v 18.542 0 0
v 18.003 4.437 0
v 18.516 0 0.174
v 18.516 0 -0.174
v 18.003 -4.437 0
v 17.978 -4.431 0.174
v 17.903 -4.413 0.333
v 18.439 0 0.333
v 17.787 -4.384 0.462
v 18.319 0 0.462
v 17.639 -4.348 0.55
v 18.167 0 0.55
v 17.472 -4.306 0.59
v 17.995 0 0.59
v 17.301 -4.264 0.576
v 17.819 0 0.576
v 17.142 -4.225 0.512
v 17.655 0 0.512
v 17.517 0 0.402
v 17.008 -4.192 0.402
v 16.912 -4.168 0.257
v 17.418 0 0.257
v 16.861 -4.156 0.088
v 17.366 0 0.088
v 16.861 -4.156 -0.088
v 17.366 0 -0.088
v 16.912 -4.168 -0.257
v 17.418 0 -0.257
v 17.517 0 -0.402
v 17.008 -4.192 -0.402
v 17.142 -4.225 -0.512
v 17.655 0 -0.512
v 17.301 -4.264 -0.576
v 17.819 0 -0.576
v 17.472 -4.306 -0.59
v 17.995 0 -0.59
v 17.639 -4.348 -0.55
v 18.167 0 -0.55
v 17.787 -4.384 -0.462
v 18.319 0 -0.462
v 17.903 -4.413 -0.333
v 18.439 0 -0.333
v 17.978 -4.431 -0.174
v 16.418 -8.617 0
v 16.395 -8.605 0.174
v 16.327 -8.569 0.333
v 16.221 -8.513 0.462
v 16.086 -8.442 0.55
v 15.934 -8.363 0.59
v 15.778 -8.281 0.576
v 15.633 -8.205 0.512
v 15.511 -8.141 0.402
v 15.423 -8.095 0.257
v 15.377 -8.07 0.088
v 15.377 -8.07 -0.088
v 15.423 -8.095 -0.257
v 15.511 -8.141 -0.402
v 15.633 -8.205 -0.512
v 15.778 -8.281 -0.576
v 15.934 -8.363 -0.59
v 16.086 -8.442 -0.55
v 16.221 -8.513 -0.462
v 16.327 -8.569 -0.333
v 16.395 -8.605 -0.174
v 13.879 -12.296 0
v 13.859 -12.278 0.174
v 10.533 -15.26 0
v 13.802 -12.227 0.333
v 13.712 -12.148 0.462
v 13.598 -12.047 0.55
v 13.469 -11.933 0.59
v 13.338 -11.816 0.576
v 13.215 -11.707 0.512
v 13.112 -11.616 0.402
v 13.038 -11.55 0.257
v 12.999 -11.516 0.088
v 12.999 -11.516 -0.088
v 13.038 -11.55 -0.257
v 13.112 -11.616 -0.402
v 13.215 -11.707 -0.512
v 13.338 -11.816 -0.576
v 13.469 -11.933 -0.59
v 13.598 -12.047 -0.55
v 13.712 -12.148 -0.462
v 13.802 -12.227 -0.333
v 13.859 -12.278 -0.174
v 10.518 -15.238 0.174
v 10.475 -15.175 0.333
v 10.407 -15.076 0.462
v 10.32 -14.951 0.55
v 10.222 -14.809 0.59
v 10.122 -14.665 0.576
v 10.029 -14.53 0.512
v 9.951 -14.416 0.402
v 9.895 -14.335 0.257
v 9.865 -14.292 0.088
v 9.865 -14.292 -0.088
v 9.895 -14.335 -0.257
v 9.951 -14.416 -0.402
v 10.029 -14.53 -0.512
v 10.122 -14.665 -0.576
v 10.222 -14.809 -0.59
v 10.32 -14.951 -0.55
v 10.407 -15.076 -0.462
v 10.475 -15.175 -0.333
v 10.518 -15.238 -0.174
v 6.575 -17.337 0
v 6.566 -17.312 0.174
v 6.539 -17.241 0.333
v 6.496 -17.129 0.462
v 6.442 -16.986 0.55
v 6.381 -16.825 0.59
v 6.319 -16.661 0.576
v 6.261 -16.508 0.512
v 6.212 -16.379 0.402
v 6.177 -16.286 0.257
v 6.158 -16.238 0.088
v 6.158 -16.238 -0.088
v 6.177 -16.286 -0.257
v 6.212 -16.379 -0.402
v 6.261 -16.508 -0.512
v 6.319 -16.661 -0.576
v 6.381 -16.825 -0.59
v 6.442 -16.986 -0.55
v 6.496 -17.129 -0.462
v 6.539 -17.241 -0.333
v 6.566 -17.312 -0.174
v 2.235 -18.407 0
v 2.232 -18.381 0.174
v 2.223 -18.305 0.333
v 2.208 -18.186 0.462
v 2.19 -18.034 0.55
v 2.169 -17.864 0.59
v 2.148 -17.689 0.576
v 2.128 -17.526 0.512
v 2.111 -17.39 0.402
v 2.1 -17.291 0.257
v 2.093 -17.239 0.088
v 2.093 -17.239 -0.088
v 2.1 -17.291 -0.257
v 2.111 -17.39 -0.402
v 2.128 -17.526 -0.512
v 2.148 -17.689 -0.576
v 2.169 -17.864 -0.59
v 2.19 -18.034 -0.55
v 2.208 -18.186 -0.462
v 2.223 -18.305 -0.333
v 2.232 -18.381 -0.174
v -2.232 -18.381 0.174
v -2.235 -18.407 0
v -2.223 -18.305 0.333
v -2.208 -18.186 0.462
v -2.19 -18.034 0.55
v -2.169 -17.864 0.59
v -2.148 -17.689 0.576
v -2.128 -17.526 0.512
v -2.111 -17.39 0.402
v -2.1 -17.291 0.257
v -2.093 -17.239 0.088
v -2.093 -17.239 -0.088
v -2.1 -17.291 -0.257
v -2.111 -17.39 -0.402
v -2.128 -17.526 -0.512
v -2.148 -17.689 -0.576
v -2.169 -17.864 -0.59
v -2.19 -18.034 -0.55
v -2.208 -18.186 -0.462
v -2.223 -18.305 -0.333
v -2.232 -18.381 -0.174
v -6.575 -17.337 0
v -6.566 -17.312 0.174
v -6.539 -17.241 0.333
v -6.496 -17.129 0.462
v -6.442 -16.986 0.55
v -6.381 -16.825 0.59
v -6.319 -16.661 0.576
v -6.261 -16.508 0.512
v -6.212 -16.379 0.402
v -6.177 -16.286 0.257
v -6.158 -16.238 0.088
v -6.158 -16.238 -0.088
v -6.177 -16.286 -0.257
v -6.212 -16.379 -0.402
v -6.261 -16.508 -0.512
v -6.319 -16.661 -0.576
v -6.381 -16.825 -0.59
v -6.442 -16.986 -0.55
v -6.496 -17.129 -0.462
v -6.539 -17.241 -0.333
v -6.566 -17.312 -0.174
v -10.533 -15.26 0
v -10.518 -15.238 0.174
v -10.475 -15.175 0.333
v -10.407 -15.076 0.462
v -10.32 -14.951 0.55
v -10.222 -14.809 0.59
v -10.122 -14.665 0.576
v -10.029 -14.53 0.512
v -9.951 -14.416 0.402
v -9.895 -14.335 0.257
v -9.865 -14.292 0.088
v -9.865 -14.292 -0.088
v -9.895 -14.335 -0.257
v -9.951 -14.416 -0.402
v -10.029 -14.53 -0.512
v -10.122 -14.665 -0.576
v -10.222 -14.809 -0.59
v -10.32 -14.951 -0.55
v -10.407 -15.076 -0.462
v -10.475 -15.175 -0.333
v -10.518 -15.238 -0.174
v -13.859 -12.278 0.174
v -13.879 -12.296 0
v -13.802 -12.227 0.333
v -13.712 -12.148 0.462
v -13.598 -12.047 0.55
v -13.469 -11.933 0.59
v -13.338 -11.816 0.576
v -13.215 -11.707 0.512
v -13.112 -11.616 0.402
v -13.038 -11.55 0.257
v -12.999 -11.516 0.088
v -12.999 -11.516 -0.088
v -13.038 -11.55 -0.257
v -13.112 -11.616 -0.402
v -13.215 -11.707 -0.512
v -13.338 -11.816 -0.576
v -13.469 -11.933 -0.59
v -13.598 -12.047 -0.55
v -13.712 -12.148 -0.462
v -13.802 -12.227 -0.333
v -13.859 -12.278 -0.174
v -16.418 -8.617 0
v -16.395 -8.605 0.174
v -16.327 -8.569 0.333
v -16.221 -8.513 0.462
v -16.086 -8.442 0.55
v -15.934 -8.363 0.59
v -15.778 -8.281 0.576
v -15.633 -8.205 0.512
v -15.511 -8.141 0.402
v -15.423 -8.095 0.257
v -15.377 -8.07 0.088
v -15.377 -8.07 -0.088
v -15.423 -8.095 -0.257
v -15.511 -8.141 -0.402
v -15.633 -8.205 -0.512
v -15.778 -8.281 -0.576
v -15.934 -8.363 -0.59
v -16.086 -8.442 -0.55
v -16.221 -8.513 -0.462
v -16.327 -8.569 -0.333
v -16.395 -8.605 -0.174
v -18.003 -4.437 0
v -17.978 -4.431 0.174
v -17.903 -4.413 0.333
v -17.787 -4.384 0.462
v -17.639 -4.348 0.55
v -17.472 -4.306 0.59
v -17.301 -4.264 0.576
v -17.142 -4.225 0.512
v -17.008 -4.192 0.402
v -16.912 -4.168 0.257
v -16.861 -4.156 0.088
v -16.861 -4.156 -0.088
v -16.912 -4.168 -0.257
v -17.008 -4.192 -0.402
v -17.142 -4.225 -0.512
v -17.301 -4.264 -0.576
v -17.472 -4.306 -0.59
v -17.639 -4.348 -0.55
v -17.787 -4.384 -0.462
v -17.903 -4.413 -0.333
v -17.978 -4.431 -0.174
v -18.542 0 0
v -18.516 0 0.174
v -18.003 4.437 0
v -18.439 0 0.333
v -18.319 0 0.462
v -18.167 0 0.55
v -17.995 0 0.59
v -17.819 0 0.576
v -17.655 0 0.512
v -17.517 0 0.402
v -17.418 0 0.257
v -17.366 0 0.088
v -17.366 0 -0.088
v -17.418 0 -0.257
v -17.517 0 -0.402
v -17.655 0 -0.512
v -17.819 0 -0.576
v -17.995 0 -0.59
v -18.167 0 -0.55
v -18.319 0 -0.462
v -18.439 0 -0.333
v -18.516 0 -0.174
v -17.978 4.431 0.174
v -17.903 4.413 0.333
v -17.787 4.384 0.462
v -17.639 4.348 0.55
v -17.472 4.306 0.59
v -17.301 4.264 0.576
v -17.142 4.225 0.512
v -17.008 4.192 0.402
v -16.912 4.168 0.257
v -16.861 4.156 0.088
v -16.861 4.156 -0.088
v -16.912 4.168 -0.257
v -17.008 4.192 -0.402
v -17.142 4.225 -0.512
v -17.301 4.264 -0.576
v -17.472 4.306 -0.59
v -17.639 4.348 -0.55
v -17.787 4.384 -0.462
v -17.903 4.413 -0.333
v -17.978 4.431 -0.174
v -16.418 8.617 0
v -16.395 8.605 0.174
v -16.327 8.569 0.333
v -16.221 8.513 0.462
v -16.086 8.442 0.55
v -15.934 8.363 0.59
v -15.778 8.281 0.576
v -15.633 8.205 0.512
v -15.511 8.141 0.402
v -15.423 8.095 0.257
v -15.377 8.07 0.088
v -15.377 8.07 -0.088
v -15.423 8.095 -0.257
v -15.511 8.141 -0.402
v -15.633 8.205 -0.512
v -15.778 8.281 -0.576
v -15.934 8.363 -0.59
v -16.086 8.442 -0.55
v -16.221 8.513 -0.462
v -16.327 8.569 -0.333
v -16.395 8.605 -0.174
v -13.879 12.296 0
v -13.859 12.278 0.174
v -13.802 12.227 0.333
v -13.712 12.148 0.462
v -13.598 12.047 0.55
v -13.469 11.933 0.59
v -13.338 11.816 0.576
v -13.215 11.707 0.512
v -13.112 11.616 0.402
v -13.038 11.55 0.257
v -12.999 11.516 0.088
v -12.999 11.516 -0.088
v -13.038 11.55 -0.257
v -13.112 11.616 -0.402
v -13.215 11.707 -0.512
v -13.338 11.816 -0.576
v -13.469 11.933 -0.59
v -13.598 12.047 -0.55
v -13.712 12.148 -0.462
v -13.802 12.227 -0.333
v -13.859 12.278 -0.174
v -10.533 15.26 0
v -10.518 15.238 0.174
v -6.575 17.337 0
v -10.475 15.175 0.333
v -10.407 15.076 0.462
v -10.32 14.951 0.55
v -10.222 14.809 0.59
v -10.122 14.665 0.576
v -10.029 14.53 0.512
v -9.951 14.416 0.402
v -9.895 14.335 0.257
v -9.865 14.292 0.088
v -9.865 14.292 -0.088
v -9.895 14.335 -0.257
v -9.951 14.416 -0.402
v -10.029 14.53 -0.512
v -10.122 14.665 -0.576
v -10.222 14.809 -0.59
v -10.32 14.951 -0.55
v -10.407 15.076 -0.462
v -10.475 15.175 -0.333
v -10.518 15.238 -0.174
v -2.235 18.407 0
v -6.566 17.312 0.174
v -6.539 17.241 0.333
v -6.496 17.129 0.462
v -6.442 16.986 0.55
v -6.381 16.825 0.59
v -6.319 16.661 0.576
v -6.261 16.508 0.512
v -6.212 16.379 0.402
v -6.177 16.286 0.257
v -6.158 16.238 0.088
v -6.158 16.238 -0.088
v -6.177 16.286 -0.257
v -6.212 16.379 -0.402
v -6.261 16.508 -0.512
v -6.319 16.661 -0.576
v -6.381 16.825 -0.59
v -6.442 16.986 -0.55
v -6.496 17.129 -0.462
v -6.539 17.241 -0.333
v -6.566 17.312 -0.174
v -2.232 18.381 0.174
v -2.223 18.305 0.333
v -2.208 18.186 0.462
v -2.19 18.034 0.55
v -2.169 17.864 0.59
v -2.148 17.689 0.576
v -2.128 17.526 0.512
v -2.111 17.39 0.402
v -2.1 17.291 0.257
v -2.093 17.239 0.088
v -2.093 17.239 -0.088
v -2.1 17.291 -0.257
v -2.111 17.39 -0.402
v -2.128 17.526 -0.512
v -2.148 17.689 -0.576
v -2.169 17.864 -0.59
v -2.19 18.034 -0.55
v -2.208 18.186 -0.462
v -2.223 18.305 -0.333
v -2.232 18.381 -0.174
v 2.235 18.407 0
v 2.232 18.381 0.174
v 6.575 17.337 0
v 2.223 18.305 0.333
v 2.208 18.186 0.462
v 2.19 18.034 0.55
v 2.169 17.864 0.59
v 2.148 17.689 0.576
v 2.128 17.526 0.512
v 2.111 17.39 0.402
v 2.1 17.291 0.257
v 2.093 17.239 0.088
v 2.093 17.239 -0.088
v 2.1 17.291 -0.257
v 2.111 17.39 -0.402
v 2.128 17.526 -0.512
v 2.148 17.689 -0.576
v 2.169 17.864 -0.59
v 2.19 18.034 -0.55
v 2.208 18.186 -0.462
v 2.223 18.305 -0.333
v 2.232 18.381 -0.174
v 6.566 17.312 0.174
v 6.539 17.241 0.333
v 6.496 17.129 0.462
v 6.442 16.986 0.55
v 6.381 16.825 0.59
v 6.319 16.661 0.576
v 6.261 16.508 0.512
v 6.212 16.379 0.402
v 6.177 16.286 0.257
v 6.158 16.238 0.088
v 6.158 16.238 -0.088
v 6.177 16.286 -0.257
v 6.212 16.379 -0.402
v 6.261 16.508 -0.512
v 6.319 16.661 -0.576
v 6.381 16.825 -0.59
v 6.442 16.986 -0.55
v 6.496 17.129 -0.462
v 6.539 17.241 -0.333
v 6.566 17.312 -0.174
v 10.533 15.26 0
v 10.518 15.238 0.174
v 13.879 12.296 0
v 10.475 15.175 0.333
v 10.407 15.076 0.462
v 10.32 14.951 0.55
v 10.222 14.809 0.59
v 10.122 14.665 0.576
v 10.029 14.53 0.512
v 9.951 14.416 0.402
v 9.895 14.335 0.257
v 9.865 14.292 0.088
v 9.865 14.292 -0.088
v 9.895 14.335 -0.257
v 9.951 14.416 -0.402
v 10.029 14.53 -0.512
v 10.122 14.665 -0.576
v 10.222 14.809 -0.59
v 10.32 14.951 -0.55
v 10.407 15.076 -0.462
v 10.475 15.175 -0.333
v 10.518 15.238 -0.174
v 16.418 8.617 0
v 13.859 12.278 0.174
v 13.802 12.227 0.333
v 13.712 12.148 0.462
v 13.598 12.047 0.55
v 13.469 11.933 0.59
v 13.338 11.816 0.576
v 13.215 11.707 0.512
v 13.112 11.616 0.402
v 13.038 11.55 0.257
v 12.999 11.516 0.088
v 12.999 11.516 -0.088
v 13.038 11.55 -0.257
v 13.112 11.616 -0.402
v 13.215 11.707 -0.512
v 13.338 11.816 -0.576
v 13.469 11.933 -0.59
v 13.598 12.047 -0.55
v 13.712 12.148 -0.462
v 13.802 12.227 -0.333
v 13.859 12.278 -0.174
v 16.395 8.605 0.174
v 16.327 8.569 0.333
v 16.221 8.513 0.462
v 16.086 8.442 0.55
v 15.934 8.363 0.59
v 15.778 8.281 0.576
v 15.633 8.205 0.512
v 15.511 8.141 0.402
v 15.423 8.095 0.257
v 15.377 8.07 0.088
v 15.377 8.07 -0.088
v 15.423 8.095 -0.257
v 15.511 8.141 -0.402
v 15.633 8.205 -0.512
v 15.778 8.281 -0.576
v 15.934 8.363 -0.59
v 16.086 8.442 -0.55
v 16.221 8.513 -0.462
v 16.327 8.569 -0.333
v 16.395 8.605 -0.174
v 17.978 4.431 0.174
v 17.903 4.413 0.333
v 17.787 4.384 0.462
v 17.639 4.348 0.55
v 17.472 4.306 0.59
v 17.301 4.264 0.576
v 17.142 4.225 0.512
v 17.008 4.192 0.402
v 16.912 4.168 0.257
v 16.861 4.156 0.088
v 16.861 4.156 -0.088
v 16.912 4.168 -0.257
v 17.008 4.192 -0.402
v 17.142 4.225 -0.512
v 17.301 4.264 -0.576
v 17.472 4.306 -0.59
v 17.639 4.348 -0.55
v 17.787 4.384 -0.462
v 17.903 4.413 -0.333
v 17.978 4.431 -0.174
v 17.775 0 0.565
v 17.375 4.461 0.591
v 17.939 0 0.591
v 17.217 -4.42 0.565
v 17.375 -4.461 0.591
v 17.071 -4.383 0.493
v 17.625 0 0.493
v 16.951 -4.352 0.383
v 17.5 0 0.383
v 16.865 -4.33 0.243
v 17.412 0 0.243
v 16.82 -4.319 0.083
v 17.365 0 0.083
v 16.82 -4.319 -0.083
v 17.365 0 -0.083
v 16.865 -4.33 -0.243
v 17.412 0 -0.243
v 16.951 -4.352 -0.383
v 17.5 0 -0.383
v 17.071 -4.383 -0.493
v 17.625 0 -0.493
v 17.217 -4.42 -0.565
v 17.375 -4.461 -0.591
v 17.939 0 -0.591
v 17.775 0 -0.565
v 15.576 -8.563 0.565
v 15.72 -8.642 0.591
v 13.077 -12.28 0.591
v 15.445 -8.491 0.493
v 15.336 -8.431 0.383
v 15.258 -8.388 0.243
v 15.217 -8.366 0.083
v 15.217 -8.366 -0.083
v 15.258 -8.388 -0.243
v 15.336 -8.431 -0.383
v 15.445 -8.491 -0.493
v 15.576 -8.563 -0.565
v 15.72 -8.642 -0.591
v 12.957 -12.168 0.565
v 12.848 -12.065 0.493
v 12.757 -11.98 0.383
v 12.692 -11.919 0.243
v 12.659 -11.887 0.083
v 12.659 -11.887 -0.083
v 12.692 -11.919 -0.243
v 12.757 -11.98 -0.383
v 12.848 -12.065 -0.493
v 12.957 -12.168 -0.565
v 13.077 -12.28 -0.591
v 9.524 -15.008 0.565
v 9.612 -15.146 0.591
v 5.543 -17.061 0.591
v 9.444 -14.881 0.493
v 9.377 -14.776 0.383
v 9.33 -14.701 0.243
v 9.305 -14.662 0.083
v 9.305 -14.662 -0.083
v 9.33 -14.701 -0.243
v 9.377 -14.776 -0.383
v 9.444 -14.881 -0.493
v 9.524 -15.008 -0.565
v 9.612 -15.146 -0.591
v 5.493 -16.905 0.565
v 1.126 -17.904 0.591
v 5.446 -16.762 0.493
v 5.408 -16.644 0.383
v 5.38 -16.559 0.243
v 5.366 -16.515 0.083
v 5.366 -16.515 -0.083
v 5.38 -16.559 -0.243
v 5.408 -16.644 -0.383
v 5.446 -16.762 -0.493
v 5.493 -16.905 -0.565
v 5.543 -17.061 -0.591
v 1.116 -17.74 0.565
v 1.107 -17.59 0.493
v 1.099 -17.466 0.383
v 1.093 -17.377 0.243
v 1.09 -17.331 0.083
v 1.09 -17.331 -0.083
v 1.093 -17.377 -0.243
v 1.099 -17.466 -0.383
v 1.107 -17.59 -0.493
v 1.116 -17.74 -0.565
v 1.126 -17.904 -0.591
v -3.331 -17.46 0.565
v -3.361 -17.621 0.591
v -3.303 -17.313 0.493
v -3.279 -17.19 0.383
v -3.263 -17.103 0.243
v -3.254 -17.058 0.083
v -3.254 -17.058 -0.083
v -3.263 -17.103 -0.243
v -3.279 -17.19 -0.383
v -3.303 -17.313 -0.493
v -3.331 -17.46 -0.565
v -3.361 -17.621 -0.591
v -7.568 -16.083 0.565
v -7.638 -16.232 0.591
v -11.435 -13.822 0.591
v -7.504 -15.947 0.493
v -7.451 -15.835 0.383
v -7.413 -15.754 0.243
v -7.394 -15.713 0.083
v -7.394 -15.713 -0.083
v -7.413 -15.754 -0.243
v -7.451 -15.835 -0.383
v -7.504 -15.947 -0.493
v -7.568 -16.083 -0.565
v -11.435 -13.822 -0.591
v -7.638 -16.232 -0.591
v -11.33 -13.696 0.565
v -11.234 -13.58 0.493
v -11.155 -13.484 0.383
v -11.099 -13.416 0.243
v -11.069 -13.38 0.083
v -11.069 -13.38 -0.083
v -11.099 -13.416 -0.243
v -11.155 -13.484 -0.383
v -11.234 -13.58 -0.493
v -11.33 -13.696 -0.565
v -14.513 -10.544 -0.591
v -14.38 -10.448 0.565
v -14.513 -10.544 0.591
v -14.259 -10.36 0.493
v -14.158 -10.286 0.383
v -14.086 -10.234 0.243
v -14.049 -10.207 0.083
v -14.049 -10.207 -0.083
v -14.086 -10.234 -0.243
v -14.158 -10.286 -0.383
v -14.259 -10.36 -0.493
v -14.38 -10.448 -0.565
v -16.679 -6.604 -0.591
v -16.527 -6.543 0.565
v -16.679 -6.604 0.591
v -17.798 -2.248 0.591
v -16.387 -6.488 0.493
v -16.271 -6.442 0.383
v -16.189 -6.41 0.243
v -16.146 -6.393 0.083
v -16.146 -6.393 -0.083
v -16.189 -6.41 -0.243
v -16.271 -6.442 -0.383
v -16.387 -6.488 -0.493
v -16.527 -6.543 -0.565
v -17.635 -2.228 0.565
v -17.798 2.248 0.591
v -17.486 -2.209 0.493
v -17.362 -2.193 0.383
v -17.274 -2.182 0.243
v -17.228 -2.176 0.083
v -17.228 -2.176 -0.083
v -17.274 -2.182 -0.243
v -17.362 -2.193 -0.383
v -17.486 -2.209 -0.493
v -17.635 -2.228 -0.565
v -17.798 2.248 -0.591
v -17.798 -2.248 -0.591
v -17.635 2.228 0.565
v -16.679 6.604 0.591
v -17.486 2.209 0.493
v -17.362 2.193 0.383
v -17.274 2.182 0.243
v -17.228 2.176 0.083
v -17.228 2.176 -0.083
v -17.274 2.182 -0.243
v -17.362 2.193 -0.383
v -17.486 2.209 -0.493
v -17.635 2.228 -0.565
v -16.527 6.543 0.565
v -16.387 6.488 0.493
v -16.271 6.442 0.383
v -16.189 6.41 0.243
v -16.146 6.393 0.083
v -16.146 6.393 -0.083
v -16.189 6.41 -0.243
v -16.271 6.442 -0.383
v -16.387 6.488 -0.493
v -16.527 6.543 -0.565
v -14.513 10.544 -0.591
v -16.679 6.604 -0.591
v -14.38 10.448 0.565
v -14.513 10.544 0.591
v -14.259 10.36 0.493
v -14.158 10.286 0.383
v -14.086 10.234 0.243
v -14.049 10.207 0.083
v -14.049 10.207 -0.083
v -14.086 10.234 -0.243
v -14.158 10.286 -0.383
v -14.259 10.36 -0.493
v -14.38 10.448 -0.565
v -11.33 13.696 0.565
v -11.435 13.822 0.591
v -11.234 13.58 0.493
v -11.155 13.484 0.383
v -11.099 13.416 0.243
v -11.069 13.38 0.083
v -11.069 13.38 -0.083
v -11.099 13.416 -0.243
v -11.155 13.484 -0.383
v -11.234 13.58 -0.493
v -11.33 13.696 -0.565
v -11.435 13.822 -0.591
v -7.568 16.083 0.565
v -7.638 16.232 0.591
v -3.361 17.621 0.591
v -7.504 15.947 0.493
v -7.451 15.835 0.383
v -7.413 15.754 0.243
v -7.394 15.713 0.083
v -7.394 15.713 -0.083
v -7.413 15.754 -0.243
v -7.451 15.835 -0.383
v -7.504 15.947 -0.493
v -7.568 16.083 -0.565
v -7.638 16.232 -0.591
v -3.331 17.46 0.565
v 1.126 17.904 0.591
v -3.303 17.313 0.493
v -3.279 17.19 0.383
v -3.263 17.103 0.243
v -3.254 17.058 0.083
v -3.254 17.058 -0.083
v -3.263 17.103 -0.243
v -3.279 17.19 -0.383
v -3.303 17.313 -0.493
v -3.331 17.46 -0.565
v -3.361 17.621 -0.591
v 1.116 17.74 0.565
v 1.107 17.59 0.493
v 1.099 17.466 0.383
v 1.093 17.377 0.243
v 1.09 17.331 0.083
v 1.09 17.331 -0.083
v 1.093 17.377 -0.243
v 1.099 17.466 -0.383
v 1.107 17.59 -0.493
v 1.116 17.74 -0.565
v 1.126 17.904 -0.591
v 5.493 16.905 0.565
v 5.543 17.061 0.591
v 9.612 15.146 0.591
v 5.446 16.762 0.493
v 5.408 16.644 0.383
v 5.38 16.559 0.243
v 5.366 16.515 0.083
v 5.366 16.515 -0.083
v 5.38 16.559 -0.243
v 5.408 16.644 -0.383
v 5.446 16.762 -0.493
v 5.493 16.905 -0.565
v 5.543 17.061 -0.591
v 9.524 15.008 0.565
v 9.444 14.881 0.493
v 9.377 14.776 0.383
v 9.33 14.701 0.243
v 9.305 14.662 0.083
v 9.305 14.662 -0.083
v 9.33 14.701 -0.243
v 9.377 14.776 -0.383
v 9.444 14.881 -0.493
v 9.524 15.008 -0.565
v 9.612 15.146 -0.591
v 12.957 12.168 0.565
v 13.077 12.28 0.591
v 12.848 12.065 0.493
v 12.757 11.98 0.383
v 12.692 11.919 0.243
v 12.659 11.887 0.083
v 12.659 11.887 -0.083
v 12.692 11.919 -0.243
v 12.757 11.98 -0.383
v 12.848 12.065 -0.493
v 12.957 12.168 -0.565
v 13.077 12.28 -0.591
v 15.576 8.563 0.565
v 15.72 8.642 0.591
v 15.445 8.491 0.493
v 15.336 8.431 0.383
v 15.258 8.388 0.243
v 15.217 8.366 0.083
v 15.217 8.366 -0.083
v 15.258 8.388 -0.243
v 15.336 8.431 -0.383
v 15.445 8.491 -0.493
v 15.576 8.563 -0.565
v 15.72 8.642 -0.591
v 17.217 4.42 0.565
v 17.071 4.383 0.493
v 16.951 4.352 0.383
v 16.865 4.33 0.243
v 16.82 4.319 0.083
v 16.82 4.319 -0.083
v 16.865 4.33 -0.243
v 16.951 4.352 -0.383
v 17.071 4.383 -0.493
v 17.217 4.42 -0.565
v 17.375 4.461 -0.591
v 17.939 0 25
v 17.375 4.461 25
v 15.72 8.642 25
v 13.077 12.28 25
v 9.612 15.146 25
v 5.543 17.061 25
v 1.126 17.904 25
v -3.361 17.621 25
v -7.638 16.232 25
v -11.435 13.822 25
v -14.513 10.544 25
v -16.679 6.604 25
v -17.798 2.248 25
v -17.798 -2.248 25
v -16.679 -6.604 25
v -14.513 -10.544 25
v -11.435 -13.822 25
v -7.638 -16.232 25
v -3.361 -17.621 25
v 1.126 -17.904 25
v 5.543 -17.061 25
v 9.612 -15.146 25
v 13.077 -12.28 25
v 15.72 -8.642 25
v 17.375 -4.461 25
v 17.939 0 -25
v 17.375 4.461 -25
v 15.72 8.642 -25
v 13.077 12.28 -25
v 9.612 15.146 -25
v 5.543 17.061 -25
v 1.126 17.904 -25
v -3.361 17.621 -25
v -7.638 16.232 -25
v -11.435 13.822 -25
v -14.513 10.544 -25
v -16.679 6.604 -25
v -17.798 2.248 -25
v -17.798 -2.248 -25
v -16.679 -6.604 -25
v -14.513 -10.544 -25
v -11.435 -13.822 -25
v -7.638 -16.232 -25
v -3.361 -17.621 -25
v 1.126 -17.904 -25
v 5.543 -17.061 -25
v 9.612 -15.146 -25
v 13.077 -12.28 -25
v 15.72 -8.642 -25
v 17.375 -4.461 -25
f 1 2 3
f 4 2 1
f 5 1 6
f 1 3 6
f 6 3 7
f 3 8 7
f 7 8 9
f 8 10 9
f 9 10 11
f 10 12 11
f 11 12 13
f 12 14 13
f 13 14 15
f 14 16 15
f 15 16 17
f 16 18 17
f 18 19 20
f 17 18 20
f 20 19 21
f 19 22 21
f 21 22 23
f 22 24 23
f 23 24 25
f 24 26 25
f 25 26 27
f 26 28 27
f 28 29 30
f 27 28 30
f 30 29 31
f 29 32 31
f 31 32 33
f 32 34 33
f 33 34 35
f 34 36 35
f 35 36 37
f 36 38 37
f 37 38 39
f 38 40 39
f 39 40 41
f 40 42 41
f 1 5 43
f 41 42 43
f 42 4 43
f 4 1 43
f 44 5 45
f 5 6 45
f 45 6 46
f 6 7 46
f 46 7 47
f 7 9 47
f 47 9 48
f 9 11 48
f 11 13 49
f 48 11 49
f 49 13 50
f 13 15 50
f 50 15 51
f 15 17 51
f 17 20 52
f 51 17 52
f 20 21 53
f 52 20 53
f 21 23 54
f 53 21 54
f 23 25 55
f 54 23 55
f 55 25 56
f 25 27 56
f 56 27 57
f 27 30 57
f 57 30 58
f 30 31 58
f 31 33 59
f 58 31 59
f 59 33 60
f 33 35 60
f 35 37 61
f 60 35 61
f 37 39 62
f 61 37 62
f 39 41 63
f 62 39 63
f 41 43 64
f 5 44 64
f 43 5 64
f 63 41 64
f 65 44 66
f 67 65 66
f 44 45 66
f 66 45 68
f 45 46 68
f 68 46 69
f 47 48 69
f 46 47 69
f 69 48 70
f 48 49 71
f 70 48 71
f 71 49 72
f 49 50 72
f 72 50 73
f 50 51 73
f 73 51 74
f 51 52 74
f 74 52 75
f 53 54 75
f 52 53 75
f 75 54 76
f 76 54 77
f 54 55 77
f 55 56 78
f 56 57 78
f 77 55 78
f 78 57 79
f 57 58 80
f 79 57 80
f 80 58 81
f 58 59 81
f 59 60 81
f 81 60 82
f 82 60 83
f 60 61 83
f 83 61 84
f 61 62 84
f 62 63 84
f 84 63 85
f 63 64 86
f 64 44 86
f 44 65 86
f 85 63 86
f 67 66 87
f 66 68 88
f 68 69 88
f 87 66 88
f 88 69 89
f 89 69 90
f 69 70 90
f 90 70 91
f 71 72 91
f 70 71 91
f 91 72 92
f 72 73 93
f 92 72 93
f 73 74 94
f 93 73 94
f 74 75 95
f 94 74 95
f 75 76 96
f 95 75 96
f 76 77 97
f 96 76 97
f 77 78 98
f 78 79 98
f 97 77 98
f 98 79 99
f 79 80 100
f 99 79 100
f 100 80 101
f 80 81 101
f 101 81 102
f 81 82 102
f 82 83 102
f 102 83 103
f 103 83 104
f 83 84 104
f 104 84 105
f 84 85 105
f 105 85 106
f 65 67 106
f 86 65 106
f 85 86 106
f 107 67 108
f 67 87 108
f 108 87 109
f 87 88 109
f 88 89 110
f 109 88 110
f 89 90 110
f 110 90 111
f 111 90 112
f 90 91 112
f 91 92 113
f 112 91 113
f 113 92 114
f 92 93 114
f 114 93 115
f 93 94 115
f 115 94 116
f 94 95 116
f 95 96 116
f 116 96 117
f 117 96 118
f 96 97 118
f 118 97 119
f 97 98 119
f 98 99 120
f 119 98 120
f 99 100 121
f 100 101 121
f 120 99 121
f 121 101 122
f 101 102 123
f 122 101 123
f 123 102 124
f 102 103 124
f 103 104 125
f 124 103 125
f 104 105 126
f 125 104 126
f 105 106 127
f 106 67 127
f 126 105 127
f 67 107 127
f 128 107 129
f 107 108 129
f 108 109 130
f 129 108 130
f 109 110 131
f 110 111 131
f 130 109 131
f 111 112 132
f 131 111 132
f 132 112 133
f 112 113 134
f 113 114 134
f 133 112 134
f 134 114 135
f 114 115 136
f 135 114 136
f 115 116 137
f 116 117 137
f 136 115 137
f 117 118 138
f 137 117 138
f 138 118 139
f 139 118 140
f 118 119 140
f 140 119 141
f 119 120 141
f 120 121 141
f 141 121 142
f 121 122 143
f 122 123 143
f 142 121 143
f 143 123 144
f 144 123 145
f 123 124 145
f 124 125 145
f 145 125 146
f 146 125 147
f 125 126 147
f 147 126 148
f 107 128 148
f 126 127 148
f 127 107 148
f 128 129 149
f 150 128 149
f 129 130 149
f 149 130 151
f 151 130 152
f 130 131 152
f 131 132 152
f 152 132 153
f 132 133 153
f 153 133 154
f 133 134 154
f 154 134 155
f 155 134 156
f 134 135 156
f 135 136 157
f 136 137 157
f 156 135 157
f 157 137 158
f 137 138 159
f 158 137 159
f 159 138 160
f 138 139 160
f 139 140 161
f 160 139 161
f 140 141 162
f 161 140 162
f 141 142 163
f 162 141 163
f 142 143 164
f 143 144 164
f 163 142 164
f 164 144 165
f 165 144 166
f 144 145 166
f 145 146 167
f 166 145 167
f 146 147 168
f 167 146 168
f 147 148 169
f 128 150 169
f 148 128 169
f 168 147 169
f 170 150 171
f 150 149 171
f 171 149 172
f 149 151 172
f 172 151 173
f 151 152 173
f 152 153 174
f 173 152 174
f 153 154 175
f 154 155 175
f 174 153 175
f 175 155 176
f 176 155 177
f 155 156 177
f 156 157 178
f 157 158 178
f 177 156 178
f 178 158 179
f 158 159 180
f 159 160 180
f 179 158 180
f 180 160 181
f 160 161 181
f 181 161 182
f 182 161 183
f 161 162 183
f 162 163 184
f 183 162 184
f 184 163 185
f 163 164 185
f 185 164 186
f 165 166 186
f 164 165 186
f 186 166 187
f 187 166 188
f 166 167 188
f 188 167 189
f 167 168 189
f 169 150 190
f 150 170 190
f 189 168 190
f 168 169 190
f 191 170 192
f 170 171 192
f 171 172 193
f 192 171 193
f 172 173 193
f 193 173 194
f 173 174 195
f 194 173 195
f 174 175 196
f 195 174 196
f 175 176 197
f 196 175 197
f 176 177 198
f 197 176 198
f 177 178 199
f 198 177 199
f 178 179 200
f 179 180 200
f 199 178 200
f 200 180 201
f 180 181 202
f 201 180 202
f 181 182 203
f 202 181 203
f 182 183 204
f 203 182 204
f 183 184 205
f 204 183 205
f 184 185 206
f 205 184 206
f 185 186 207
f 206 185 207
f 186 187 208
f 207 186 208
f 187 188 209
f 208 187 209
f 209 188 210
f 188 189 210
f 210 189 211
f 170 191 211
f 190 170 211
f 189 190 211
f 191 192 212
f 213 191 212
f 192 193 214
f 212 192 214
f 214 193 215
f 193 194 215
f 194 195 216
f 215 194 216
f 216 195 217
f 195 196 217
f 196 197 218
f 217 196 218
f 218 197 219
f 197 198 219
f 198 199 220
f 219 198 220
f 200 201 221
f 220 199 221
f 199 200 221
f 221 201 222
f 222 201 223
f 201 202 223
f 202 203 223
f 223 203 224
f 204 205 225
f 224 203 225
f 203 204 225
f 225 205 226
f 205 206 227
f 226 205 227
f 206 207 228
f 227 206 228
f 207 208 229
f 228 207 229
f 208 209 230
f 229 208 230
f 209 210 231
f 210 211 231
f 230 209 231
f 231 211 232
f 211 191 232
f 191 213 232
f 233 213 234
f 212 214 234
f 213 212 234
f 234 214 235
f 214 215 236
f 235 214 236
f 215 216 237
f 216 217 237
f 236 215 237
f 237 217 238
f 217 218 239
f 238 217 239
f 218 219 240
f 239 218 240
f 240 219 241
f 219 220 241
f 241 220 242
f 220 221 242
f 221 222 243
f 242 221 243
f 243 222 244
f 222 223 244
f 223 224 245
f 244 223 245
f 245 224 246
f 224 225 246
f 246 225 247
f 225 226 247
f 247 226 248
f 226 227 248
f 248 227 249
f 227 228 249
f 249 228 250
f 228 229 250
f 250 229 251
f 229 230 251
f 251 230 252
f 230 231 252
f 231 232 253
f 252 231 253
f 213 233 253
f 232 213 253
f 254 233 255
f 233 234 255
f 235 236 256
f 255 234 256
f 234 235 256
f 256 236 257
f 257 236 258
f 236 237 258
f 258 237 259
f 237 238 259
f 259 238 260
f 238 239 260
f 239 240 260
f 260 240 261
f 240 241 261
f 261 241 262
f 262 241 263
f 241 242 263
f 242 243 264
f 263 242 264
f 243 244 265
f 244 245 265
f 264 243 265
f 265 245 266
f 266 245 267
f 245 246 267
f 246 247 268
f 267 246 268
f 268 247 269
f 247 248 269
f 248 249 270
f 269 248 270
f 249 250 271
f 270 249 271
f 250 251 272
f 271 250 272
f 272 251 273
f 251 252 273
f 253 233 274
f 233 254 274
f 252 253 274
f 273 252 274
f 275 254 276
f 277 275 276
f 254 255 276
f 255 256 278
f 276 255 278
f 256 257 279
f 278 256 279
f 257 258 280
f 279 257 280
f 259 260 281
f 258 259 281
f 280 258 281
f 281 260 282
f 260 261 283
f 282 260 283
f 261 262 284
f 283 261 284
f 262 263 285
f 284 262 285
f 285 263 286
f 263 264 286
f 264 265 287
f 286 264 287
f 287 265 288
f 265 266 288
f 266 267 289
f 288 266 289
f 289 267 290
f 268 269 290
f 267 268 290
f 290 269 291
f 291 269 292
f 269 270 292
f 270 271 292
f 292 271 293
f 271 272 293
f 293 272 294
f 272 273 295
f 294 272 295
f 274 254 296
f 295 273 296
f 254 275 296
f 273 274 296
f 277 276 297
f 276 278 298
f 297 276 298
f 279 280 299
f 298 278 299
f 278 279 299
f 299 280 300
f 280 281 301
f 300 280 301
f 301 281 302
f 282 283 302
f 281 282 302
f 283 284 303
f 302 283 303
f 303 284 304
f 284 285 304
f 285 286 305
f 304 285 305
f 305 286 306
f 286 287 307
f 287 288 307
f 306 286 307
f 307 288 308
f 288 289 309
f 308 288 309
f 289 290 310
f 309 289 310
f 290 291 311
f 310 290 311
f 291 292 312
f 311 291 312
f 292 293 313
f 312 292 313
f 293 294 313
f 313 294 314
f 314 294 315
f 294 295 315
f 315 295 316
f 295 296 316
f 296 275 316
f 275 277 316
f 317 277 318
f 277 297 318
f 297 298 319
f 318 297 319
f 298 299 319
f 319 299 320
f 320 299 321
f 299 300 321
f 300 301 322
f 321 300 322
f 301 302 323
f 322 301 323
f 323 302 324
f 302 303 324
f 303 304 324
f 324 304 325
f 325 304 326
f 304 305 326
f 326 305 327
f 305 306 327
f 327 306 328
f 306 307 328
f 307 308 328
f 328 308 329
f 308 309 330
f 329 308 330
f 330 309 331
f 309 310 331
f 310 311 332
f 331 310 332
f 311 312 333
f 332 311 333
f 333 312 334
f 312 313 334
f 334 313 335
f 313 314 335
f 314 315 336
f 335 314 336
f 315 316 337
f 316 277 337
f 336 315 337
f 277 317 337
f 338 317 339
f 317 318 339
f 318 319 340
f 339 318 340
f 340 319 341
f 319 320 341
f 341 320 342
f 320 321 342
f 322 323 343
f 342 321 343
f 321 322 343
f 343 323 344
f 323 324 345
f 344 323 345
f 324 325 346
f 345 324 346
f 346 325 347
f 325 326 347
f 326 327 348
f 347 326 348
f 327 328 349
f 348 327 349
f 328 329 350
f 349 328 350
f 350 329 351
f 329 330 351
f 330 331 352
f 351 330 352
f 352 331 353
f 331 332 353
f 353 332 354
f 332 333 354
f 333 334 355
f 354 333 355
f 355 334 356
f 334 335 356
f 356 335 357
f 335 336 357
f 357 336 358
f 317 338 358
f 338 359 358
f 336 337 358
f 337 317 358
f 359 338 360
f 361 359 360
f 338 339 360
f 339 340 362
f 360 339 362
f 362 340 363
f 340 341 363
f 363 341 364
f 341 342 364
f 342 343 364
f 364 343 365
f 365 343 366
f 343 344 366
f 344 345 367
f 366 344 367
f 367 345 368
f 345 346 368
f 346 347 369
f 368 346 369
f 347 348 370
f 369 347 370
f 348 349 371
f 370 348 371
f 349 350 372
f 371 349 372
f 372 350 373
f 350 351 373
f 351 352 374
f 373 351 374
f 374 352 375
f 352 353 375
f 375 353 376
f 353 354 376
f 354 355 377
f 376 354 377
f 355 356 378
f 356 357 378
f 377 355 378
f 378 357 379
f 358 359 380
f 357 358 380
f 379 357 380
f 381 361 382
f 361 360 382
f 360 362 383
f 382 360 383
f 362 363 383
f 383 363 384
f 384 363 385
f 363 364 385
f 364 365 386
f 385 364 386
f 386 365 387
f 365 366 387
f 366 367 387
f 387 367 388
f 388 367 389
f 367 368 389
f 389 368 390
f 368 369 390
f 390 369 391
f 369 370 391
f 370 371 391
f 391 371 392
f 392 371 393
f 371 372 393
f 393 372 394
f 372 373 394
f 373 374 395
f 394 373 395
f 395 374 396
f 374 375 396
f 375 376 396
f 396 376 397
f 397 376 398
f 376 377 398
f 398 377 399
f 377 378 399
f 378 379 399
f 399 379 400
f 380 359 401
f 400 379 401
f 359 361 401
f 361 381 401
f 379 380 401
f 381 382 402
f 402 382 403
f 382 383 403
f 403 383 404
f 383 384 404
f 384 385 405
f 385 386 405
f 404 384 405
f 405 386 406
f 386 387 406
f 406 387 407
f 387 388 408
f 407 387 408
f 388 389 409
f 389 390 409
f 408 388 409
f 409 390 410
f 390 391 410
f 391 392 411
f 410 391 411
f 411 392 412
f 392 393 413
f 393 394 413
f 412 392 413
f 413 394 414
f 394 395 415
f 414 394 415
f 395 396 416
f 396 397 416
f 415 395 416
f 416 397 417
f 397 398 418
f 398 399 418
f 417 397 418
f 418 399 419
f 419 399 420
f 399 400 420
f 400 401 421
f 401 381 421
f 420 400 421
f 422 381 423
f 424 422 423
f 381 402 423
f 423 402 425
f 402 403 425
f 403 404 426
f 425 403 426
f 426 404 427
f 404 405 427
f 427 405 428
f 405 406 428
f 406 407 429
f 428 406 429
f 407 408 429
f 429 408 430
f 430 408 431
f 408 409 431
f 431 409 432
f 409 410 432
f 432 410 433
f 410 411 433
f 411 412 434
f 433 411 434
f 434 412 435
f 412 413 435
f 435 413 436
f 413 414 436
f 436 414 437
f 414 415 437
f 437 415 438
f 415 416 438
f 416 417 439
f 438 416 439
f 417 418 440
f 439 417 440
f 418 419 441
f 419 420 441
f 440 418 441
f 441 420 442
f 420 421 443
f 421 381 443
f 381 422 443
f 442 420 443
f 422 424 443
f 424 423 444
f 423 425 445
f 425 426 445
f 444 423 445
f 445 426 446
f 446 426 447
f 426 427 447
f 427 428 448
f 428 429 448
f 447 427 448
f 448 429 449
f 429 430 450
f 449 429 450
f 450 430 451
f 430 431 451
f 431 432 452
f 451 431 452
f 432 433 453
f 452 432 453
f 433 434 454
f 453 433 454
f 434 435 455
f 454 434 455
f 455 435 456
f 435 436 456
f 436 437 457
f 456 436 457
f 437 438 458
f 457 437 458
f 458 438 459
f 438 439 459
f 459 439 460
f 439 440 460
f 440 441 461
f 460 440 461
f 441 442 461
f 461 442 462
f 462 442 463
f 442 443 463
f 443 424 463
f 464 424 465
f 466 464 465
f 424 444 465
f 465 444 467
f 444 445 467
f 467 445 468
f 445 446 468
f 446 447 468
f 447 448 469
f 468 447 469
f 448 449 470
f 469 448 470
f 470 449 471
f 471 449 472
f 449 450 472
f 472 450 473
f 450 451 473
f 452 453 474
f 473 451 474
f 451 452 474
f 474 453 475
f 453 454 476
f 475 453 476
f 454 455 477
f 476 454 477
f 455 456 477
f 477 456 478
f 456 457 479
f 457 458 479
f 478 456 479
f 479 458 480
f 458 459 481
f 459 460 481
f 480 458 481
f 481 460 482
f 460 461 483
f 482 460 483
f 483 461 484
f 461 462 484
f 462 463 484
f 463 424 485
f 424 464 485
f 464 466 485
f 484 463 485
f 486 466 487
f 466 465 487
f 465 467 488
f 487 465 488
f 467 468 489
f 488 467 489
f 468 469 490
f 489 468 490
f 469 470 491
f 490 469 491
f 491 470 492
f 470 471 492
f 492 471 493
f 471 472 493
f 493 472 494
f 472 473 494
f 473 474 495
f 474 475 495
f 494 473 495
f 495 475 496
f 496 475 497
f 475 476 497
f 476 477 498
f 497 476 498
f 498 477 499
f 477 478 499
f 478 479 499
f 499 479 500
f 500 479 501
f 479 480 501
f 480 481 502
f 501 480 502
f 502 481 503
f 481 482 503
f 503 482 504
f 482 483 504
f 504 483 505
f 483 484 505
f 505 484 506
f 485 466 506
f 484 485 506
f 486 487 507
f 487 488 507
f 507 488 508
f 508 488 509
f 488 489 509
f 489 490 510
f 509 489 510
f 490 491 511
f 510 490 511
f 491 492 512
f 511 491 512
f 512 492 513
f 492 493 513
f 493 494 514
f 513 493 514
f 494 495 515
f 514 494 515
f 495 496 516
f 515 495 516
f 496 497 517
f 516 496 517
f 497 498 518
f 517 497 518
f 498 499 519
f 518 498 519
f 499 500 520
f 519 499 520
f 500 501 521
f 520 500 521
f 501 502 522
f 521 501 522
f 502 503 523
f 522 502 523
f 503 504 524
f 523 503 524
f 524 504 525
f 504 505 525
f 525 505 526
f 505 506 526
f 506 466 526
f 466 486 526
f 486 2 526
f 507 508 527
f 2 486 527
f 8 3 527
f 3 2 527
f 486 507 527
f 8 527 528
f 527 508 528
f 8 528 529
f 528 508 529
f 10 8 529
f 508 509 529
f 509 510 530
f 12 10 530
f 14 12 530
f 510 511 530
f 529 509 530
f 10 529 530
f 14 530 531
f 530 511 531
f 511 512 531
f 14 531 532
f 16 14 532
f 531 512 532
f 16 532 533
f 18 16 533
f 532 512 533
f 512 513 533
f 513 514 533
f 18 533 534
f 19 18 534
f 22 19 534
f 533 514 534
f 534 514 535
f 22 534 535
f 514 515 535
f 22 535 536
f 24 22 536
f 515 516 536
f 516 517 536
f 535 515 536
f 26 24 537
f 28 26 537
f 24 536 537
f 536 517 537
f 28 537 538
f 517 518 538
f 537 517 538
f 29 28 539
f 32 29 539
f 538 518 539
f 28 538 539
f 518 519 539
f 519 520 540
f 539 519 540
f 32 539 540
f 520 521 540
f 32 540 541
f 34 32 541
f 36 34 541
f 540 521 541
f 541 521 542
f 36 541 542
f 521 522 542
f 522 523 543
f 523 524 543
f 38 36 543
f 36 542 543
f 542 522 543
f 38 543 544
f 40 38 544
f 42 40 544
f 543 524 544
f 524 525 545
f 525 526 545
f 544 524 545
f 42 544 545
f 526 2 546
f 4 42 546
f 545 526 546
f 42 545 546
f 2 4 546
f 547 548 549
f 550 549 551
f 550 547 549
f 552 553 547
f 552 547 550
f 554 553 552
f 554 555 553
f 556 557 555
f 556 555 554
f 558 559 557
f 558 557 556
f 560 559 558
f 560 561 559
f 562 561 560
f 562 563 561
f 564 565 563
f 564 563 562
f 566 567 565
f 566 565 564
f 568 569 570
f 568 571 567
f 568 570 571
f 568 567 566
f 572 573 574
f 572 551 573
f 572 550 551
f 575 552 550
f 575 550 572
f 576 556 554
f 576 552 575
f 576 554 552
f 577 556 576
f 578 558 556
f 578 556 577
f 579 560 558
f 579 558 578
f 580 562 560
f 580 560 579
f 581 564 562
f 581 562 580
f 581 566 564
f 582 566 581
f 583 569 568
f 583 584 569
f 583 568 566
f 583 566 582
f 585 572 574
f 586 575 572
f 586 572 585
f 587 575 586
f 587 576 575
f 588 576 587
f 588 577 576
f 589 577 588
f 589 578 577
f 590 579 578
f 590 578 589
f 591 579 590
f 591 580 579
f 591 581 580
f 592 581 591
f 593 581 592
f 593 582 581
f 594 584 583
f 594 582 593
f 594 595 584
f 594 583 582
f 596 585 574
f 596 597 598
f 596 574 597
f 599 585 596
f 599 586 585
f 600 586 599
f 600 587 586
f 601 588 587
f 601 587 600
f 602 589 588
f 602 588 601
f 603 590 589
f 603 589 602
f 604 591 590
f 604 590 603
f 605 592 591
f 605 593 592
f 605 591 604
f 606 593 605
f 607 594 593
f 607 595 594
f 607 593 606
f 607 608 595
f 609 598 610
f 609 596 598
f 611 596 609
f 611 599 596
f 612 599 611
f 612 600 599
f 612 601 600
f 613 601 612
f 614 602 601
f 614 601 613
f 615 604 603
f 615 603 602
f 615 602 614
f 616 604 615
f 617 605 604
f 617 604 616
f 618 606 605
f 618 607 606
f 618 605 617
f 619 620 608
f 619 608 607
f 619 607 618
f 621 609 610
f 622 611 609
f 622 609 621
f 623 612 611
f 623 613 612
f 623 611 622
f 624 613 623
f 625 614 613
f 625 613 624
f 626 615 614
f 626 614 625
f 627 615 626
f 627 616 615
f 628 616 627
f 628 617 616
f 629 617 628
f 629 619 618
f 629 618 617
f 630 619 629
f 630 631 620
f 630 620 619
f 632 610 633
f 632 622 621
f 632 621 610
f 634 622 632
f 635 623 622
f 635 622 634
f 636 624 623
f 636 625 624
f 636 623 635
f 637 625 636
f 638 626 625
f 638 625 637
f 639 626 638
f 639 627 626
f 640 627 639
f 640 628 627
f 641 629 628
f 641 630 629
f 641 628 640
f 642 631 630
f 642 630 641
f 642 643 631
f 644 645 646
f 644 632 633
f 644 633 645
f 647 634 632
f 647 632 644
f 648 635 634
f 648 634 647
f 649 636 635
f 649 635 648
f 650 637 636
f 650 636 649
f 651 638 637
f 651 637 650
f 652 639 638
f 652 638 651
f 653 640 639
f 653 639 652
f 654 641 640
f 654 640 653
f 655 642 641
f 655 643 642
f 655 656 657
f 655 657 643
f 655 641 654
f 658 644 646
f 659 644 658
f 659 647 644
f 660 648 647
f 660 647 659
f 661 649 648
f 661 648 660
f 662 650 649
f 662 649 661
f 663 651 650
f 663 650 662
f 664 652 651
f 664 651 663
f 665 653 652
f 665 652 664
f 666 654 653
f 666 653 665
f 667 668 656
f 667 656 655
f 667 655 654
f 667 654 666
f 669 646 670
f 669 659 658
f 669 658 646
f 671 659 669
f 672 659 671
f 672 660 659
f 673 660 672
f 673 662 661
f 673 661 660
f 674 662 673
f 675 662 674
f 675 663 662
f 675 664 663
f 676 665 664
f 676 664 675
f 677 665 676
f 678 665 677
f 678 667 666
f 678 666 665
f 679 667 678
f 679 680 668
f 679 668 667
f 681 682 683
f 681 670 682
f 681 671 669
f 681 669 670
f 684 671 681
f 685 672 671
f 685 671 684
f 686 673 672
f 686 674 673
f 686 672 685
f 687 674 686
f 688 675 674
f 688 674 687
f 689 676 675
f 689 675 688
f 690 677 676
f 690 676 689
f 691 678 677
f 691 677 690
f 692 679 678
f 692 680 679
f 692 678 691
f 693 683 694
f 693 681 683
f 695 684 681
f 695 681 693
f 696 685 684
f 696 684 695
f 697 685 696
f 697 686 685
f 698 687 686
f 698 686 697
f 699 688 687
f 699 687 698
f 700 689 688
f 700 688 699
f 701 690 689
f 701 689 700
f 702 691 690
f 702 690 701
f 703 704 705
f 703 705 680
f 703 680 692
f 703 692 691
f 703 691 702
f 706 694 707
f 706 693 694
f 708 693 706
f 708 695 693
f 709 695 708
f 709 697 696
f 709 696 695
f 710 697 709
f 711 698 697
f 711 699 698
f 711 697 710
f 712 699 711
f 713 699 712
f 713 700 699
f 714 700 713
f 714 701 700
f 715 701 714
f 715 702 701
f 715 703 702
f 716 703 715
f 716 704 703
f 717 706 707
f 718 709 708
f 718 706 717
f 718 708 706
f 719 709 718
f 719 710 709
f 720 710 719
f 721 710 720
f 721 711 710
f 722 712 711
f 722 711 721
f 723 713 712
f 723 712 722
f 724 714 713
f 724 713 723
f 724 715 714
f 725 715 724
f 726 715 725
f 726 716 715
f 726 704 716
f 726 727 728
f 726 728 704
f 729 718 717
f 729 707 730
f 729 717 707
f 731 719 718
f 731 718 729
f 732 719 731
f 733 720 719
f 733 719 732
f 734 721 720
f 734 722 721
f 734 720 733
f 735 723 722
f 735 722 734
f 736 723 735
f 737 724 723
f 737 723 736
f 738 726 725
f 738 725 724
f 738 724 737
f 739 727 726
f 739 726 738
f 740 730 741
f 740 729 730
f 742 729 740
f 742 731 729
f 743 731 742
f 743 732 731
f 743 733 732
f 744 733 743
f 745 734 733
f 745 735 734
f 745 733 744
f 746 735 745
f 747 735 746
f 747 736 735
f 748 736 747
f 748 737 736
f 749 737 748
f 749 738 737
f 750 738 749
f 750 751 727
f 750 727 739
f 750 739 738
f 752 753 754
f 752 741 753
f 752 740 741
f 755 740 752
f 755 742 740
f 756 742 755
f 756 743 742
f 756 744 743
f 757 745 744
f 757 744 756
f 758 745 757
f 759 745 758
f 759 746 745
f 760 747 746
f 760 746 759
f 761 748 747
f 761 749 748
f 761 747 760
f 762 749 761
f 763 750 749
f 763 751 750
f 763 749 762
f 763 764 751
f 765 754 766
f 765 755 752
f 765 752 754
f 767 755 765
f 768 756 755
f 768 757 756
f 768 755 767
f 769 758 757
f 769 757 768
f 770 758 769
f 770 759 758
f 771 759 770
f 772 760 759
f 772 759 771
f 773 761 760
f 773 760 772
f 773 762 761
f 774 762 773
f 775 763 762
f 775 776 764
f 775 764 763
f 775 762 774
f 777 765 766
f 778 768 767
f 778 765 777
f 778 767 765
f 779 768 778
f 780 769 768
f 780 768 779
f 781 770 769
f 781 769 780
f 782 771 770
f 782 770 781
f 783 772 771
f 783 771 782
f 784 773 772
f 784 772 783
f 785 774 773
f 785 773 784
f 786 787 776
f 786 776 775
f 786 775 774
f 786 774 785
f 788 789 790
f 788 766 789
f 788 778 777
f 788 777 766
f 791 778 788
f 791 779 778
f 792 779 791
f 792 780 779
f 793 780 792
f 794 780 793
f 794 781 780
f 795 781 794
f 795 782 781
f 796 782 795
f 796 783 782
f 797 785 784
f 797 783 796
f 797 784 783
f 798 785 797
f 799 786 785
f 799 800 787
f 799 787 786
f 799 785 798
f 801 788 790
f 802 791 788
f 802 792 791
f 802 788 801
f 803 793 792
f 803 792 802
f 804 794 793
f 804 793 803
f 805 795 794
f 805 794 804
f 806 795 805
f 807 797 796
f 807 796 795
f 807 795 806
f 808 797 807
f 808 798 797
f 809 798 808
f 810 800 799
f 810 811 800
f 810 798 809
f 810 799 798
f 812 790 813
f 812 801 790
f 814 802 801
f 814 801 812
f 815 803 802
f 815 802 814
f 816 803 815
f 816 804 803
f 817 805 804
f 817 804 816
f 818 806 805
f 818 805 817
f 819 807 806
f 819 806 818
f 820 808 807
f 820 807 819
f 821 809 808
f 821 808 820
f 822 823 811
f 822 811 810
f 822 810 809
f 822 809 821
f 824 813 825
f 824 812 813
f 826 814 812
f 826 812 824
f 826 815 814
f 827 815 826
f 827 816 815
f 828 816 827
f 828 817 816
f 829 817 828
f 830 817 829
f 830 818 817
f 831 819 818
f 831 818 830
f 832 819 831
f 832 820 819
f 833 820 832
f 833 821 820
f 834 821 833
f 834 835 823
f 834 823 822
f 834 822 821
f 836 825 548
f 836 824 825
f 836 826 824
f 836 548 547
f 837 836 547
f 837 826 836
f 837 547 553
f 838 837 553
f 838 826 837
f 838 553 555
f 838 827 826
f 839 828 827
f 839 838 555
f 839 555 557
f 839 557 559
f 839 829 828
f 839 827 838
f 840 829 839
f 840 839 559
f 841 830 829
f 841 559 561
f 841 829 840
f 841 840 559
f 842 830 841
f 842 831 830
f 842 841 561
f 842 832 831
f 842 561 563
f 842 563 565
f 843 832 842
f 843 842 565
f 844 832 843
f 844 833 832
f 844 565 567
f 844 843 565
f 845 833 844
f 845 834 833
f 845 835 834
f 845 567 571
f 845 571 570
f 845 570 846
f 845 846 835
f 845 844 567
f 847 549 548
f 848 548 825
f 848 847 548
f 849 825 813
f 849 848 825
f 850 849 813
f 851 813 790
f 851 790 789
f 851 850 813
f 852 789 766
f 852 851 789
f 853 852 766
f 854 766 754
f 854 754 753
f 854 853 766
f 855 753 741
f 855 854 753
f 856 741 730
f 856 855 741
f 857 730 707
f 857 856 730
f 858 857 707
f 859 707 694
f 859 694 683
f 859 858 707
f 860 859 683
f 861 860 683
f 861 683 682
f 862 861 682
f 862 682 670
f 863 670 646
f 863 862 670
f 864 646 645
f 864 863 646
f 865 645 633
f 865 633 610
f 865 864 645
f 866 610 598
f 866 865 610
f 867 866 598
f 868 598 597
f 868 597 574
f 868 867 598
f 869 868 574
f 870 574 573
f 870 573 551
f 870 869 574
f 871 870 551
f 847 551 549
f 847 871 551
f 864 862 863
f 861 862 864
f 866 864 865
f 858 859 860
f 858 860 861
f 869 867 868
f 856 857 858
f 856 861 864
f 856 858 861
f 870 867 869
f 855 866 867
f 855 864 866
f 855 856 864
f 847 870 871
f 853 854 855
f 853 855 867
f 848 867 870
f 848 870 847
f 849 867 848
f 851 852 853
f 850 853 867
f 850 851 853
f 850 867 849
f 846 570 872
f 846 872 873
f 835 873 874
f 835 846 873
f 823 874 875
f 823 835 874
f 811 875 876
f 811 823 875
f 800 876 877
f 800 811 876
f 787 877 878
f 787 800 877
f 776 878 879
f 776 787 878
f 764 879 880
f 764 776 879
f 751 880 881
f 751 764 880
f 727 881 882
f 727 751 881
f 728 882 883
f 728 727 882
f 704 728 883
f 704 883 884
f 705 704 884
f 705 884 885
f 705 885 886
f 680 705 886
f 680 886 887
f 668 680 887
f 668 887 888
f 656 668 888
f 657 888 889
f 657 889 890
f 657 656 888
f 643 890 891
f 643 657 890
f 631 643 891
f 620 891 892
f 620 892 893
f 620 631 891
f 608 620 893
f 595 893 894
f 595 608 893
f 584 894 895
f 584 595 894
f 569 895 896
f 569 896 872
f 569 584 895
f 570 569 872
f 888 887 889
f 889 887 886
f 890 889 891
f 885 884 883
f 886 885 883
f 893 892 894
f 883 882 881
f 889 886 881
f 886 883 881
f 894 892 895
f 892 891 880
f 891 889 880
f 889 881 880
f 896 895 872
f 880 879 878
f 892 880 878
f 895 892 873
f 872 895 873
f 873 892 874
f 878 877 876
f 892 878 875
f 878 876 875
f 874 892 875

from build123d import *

# Parameters (mm, degrees)
F0_R     = 17.939
F1_DEPTH = 25
F2_R     = 0.591216


with BuildPart() as f1:
    # F0 (on Top) → F1 (new body, symmetric)
    with BuildSketch(Plane.XY):
        Circle(F0_R)
    extrude(amount=F1_DEPTH, both=True)

    # F2 (on Front) → F3 (revolve, cut)
    with BuildSketch(Plane.XZ):
        with Locations((17.950652, 0)):
            Circle(F2_R)
    revolve(axis=Axis((0, 0, 10.13613), (0, 0, -1)), mode=Mode.SUBTRACT)


with BuildPart() as f4:
    # F2 (on Front) → F4 (revolve)
    with BuildSketch(Plane.XZ):
        with Locations((17.950652, 0)):
            Circle(F2_R)
    revolve(axis=Axis((0, 0, 10.13613), (0, 0, -1)))


solid = Compound([f1.part, f4.part])
